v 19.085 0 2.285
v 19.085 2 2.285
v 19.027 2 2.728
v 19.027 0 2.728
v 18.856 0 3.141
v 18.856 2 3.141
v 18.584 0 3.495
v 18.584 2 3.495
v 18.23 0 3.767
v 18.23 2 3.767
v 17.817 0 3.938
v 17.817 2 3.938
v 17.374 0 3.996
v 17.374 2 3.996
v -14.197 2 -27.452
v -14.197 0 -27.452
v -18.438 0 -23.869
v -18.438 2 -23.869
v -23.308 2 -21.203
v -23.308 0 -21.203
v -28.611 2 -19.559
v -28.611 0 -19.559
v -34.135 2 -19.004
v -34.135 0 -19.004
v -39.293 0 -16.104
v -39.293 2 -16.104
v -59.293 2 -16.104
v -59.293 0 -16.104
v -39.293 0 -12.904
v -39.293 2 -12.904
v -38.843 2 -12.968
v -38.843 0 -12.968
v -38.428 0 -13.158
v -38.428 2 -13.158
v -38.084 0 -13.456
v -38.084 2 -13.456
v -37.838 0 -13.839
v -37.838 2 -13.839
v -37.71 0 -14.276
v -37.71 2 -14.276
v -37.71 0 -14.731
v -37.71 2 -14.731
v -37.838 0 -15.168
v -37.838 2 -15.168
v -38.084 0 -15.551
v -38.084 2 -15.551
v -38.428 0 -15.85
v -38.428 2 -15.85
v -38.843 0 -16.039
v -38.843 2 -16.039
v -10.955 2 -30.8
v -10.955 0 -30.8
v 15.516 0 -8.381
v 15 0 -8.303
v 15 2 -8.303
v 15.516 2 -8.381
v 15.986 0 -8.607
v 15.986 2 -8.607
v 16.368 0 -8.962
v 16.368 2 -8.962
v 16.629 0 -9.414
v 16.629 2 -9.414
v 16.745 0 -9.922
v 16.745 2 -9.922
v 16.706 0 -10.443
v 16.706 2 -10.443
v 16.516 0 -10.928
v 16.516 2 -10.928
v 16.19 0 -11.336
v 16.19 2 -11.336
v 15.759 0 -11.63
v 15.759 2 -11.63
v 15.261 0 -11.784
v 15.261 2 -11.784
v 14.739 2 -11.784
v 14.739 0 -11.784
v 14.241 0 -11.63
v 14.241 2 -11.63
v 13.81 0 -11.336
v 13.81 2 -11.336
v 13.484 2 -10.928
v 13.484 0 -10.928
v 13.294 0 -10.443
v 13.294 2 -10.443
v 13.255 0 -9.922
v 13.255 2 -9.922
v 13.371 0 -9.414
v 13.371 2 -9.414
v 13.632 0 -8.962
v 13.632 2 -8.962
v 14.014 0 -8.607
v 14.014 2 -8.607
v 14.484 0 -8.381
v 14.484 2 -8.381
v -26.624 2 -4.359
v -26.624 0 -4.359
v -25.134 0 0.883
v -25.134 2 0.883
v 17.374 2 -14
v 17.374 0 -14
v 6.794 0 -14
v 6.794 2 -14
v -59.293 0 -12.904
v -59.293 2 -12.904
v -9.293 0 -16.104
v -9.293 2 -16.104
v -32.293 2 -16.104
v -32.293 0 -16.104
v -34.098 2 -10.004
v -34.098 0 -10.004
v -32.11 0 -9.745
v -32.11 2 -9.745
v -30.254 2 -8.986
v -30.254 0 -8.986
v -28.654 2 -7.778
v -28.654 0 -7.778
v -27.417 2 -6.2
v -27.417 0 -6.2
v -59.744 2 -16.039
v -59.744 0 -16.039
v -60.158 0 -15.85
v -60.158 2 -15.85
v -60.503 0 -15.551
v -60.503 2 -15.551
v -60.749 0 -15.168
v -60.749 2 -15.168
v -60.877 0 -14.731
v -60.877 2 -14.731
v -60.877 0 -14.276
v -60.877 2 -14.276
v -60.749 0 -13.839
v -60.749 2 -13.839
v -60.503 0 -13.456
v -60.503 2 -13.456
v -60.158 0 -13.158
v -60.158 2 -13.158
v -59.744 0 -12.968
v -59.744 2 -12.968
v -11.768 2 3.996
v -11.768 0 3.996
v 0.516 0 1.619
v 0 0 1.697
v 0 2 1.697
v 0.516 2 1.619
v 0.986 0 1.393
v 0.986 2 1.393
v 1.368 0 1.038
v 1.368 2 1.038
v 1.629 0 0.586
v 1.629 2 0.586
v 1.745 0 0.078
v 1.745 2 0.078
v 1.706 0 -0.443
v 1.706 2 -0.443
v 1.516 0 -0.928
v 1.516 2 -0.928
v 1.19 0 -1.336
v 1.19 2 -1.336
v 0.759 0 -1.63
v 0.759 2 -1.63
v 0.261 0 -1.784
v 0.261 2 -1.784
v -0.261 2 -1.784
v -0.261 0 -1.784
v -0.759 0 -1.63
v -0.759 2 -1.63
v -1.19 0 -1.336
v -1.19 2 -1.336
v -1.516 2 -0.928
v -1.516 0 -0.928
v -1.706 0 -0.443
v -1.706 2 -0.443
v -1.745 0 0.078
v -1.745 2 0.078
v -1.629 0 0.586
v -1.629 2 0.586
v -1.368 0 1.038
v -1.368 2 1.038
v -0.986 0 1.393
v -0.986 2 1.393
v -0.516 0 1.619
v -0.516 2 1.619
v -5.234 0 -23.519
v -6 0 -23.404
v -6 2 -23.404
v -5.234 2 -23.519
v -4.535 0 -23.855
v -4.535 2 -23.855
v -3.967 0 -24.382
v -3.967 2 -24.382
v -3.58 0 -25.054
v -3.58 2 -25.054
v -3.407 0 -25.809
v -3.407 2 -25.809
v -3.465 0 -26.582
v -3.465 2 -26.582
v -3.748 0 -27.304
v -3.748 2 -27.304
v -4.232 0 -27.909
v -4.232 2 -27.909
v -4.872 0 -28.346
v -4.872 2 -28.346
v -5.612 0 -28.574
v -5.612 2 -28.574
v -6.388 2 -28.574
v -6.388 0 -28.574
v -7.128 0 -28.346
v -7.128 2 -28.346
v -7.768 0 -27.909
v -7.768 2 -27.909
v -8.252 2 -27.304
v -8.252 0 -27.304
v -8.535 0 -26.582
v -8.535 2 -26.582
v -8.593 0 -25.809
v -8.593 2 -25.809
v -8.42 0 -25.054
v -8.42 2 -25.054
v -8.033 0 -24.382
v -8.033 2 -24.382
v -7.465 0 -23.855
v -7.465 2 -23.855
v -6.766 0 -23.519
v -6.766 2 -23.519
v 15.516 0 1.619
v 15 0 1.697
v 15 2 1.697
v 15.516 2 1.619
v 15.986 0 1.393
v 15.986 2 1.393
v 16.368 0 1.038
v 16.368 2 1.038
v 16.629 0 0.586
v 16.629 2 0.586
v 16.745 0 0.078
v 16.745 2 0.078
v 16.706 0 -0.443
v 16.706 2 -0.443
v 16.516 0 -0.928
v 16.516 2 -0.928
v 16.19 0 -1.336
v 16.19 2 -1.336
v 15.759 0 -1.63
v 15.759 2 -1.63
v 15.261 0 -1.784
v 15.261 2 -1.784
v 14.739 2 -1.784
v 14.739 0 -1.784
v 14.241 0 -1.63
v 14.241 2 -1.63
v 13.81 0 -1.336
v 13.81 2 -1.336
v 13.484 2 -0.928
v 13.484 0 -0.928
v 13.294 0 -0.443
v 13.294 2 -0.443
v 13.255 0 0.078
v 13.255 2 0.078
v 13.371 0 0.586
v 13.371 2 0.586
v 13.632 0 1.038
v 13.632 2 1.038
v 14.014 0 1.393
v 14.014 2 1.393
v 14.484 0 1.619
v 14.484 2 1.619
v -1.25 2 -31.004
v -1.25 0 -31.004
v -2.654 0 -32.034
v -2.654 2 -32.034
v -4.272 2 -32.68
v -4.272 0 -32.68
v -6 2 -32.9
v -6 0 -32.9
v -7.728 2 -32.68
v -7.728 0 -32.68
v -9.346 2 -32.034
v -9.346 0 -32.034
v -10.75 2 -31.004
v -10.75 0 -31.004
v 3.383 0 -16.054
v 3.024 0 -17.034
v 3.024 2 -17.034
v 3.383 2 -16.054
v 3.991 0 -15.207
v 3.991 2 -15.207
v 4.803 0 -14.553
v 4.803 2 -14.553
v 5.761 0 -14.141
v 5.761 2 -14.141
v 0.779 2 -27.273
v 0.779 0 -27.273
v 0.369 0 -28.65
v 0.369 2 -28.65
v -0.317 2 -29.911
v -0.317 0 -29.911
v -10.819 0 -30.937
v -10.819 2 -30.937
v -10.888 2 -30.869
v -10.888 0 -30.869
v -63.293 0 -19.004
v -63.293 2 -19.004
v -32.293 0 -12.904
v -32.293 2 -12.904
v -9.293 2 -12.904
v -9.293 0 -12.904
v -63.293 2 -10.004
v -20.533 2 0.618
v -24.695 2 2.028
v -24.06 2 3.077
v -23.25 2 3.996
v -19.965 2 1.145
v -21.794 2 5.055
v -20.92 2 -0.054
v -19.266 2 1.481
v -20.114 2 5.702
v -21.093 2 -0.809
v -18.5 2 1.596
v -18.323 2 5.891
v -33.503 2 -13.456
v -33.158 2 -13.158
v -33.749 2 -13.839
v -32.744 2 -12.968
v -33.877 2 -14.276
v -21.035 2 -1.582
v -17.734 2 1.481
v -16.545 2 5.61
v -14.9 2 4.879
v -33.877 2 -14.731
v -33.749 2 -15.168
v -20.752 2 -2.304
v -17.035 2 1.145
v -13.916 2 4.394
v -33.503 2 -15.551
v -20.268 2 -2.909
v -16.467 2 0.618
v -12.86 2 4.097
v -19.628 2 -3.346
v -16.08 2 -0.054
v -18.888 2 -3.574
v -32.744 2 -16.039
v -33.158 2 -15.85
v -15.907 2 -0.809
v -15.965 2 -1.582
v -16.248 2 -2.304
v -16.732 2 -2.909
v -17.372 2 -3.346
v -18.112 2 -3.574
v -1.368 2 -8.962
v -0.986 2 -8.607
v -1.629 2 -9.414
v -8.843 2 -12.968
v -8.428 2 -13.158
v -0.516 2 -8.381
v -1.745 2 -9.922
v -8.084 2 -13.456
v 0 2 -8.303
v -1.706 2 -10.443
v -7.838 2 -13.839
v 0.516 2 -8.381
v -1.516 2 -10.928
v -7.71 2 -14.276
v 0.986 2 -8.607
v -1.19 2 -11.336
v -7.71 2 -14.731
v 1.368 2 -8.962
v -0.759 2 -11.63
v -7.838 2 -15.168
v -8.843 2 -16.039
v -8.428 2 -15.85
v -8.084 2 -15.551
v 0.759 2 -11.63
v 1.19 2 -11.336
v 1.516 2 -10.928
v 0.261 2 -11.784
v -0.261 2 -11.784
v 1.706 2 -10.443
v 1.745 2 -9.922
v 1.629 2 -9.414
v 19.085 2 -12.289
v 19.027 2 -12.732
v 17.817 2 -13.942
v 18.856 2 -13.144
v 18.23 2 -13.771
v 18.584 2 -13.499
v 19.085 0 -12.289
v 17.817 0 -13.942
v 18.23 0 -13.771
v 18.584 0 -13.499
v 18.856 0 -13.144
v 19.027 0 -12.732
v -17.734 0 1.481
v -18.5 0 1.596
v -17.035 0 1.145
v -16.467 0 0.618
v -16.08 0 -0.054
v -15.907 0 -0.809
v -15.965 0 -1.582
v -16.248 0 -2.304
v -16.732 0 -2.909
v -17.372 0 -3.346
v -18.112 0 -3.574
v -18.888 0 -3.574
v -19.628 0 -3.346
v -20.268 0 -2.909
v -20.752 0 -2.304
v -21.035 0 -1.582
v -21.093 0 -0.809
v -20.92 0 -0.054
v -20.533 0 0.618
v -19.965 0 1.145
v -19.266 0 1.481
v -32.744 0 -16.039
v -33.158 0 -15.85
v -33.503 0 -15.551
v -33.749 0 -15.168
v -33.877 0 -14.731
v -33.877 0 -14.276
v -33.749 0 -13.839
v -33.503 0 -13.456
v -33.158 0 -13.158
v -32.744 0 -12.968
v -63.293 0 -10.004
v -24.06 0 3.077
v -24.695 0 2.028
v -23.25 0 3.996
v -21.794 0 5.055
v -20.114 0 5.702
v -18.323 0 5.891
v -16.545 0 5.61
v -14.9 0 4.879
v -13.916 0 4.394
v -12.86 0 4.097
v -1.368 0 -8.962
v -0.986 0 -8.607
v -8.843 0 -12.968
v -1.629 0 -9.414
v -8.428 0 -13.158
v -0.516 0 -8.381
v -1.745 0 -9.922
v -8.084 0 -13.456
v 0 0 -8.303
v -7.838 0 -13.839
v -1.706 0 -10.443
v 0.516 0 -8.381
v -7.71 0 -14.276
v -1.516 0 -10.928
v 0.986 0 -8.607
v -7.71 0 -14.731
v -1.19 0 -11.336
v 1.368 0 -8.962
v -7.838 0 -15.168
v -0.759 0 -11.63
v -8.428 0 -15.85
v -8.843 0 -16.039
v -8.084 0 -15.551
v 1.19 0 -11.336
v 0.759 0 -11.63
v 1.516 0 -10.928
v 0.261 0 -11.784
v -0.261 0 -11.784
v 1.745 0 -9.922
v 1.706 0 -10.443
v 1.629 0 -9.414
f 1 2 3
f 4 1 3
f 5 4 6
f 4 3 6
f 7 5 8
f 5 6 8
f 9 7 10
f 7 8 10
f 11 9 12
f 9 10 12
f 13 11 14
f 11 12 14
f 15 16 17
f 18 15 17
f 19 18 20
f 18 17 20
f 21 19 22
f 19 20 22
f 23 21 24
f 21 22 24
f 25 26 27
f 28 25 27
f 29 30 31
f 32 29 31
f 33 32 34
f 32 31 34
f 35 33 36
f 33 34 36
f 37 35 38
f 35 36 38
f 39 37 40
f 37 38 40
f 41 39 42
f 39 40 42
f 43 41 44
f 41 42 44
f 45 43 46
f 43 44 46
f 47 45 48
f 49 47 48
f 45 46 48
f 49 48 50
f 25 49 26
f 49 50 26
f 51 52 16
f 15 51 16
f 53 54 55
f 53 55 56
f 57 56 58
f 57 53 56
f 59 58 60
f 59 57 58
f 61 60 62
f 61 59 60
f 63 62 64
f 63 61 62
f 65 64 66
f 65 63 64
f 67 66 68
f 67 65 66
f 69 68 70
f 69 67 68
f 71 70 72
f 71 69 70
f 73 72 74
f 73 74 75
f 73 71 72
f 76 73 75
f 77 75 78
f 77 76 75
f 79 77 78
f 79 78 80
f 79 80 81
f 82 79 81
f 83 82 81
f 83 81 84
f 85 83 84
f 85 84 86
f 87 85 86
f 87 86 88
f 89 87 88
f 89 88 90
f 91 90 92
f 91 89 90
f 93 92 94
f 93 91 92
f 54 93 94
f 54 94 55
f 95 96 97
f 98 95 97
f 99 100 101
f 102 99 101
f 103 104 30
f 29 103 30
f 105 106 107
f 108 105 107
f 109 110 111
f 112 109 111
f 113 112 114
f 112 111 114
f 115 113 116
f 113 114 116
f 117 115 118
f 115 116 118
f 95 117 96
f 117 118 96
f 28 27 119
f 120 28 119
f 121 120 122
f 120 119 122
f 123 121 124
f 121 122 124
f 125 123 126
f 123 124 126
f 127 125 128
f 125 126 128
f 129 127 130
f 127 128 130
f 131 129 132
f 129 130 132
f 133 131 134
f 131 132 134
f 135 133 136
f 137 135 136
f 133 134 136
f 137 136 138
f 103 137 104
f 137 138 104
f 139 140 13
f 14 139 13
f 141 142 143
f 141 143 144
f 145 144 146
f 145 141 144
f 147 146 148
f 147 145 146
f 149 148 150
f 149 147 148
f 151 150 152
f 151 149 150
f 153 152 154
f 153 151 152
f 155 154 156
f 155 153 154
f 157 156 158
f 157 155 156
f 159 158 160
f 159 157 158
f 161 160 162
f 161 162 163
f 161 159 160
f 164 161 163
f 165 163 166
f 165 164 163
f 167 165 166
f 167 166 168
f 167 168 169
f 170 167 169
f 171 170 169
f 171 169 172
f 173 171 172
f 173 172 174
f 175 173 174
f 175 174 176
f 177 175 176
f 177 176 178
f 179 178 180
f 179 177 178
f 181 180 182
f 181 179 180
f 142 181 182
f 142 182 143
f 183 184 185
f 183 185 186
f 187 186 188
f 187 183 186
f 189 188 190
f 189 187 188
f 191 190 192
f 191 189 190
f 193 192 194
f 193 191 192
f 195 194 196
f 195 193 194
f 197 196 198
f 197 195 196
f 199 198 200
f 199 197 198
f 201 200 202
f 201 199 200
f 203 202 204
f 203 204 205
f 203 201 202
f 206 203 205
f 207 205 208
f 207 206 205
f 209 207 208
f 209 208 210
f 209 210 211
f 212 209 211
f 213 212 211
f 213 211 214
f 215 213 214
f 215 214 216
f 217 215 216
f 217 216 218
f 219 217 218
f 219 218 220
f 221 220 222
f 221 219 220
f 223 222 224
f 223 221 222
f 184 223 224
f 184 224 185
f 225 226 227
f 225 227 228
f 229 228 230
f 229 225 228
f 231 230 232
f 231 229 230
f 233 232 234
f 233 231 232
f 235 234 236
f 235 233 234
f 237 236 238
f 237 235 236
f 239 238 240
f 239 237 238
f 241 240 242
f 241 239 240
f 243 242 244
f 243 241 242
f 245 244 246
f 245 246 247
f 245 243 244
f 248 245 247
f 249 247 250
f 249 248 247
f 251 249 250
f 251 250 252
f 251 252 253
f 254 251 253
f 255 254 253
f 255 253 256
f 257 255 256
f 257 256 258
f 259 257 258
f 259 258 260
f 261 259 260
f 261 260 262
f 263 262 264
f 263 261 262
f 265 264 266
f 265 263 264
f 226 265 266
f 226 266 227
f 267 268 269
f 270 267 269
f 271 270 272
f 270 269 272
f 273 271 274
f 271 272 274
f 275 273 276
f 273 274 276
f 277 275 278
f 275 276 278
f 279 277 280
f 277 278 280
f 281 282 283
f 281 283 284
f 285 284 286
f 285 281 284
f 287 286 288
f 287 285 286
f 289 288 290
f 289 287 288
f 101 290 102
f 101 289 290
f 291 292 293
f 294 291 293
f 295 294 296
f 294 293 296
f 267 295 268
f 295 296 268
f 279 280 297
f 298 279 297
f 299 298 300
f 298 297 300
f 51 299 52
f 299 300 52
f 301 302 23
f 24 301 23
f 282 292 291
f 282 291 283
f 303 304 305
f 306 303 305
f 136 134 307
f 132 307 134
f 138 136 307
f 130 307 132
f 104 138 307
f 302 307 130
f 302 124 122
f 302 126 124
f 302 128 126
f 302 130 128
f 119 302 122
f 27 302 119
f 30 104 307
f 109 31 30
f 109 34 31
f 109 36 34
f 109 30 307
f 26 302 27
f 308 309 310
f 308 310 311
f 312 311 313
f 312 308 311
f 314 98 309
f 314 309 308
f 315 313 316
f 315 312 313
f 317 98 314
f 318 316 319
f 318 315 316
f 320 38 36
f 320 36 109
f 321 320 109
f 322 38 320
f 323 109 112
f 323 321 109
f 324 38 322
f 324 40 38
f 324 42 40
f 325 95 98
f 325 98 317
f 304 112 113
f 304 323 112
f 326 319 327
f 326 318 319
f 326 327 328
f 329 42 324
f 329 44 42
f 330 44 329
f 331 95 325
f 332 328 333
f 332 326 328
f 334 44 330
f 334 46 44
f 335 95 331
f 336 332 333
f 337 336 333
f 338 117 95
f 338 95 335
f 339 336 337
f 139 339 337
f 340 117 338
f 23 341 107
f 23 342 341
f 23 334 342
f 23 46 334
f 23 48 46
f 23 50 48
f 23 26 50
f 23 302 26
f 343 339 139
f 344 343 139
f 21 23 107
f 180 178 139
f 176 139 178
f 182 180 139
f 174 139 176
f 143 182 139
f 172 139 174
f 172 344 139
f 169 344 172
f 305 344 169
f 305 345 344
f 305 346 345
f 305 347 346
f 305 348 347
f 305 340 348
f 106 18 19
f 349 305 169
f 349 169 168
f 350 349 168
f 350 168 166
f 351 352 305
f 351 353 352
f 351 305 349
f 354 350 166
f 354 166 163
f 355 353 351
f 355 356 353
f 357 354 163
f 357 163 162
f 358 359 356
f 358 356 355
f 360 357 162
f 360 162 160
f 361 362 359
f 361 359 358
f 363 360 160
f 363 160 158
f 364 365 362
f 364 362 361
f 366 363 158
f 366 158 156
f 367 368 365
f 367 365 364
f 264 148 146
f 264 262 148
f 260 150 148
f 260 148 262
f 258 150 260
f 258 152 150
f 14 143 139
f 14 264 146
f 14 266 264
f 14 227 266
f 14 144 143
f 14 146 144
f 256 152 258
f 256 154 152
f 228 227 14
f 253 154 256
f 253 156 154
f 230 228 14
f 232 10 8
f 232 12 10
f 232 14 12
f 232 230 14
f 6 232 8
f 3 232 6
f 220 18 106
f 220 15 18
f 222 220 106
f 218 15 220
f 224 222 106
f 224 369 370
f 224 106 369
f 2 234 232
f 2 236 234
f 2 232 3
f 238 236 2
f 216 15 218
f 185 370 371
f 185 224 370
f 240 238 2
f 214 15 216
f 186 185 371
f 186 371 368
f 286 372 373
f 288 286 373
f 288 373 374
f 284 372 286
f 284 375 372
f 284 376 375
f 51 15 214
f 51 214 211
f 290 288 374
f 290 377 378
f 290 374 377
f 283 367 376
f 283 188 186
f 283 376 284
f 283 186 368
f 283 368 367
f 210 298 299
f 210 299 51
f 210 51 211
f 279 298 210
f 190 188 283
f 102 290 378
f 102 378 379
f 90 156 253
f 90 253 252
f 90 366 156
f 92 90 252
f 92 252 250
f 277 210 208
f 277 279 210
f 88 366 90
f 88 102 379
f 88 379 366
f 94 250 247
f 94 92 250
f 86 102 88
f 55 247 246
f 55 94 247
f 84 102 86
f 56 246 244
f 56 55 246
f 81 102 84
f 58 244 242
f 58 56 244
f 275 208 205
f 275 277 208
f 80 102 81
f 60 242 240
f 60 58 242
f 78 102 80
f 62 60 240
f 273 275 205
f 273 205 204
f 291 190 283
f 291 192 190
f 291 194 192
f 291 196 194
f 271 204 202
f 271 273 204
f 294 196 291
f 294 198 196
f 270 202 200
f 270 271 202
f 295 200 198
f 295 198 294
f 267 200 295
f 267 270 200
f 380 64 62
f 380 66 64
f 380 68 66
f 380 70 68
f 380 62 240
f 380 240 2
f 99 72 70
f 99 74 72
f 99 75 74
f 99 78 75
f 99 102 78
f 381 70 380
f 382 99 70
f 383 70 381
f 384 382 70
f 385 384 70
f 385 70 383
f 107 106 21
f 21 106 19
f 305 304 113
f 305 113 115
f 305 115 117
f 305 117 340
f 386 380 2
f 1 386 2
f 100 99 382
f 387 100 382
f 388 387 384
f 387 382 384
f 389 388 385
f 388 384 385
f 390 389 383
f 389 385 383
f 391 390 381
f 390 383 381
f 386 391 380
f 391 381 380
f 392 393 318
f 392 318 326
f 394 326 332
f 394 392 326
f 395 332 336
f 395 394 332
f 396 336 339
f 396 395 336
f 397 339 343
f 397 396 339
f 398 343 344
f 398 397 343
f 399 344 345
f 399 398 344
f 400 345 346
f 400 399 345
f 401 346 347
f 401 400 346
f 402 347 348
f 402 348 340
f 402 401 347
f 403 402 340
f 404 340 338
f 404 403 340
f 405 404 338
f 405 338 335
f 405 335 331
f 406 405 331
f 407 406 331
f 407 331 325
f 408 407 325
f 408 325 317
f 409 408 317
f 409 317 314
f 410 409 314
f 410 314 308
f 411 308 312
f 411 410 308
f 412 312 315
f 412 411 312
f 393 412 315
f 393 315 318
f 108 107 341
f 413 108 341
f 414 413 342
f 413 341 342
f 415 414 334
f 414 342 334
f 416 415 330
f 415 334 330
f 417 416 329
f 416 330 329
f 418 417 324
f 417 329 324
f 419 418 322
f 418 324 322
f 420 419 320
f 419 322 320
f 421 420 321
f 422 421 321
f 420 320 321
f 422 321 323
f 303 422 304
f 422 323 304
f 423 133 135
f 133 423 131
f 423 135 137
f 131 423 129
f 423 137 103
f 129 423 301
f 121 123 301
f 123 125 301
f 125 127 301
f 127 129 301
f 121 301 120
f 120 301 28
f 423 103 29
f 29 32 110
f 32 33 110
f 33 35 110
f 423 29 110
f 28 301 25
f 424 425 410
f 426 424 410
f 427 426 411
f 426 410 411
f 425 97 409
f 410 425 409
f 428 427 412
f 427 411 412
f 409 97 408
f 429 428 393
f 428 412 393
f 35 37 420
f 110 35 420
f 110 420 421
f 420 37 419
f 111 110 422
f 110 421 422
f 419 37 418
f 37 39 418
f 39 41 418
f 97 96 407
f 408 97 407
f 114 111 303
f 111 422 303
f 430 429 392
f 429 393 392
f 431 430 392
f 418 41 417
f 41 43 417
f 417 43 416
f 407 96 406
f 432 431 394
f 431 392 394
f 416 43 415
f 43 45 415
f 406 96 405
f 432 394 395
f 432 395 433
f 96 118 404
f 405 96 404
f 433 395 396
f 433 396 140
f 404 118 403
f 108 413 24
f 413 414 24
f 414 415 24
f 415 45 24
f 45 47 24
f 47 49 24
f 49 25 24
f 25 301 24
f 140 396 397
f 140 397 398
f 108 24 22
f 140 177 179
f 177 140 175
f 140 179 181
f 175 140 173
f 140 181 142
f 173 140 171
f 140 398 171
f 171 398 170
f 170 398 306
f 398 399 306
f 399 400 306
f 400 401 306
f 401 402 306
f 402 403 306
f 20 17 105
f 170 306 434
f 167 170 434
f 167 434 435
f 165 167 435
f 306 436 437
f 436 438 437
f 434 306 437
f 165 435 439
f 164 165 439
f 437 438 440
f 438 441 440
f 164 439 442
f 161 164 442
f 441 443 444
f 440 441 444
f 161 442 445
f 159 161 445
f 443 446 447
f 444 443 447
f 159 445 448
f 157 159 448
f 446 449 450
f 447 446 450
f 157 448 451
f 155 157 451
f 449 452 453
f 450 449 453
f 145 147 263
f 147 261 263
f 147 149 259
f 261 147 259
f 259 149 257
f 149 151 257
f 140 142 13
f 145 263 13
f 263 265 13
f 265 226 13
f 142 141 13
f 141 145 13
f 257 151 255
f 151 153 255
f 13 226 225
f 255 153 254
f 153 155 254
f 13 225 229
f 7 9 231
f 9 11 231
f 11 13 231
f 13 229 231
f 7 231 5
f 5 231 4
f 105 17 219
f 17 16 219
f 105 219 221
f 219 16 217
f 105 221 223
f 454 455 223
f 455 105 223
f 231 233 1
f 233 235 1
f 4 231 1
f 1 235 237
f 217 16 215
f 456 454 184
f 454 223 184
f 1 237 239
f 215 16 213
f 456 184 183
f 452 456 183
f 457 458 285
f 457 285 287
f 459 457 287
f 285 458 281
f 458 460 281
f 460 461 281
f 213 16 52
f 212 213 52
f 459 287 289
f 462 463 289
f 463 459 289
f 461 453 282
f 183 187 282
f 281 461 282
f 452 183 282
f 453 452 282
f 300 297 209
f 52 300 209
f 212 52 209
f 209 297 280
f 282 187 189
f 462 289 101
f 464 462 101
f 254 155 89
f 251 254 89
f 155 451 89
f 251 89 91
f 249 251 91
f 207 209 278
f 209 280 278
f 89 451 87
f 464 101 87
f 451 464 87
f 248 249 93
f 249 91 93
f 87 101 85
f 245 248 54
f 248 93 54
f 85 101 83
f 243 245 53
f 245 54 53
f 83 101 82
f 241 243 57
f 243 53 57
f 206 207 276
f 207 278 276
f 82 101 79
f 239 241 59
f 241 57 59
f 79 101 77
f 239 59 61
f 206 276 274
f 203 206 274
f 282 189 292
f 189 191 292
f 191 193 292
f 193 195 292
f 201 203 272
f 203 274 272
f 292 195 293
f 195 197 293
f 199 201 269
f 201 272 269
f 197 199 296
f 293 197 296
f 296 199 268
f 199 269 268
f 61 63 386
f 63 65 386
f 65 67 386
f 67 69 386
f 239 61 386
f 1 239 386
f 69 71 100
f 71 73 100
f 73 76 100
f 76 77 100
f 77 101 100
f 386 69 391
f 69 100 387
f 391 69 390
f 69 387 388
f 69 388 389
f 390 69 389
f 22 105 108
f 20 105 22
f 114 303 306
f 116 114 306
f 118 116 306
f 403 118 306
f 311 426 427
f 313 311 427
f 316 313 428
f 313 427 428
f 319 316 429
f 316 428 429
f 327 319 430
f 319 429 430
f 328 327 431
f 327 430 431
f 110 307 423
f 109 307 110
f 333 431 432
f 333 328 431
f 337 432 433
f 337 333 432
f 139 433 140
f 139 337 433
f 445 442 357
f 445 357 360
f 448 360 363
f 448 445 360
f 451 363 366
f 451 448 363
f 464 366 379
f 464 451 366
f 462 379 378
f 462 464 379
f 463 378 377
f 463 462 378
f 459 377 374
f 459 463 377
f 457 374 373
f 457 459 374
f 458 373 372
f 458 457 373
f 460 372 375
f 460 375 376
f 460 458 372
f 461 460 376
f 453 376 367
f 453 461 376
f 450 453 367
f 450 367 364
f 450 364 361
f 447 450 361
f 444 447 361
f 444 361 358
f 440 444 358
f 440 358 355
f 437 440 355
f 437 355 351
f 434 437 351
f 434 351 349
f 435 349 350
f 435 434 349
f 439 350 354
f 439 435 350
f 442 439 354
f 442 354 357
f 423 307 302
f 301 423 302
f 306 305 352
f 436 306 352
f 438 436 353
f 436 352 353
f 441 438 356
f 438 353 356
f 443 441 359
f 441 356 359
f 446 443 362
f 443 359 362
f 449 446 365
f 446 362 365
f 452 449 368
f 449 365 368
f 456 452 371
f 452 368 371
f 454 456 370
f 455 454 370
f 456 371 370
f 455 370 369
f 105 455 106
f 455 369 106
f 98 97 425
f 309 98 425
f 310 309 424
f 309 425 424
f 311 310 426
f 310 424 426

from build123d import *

# Parameters (mm, degrees)
SKETCH_2_R          = 2.6
SKETCH_2_R_2        = 1.75
EXTRUDE_3_DEPTH     = 2
EXTRUDE_START       = -2
SKETCH_3_R          = 2.6
EXTRUDE_4_DEPTH     = 2
EXTRUDE_5_DEPTH     = 2
FILLET_1_R          = 6
CUT_EXTRUDE_1_DEPTH = 2
EXTRUDE_6_DEPTH     = 2
SKETCH_8_W          = 26
SKETCH_8_H          = 9
EXTRUDE_7_DEPTH     = 2


with BuildPart() as part:
    # 草图2 → 凸台-拉伸3 (new body)
    with BuildSketch(Plane(origin=(0, 0, 0), x_dir=(1, 0, 0), z_dir=(0, 1, 0))):
        Polygon((15, 14), (-1.25, 14), (-1.25, 31.003525978), (-10.75, 31.003525978), (-10.75, 19.003525978), (-37.293472201, 19.003525978), (-37.293472201, 10.003525978), (-23.25, 10.003525978), (-23.25, -3.996474022), (-13.75, -3.996474022), (15, -3.996474022), (17.373946176, -3.996474022), (17.373946176, 14), align=None)
        with Locations(Location((-18.5, 1.003525978, 0), (0, 0, 270))):
            Circle(SKETCH_2_R, mode=Mode.SUBTRACT)
        with Locations(Location((0, 0.053173587, 0), (0, 0, 270))):
            Circle(SKETCH_2_R_2, mode=Mode.SUBTRACT)
        with Locations(Location((15, 0.053173587, 0), (0, 0, 270))):
            Circle(SKETCH_2_R_2, mode=Mode.SUBTRACT)
        with Locations(Location((0, 10.053173587, 0), (0, 0, 270))):
            Circle(SKETCH_2_R_2, mode=Mode.SUBTRACT)
        with Locations(Location((15, 10.053173587, 0), (0, 0, 270))):
            Circle(SKETCH_2_R_2, mode=Mode.SUBTRACT)
        with Locations(Location((-6, 26.003525978, 0), (0, 0, 270))):
            Circle(SKETCH_2_R, mode=Mode.SUBTRACT)
    extrude(amount=EXTRUDE_3_DEPTH)

    # 草图3 → 凸台-拉伸4 (add)
    # profile 1 of 9: a face of its own
    with BuildSketch(Plane(origin=(0, 2, 0), x_dir=(1, 0, 0), z_dir=(0, 1, 0)).offset(EXTRUDE_START)):
        with BuildLine():
            Line((-1.25, 31.003525978), (-10.75, 31.003525978))
            Line((-10.75, 31.003525978), (-10.75, 21.003525978))
            ThreePointArc((-10.75, 21.003525978), (-8.557314455, 19.59863388), (-6, 19.106968866))
            ThreePointArc((-6, 19.106968866), (-3.442685545, 19.59863388), (-1.25, 21.003525978))
            Line((-1.25, 21.003525978), (-1.25, 31.003525978))
        make_face()
        with Locations(Location((-6, 26.003525978, 0), (0, 0, 270))):
            Circle(SKETCH_3_R, mode=Mode.SUBTRACT)
    # profile 2 of 9: a face of its own
    with BuildSketch(Plane(origin=(0, 2, 0), x_dir=(1, 0, 0), z_dir=(0, 1, 0)).offset(EXTRUDE_START)):
        with BuildLine():
            ThreePointArc((-10.75, 21.003525978), (-12.895048442, 25.85927974), (-10.9549552, 30.800495747))
            Line((-10.9549552, 30.800495747), (-14.196613842, 27.452074948))
            ThreePointArc((-14.196613842, 27.452074948), (-23.307699904, 21.20281017), (-34.134904, 19.003525978))
            Line((-34.134904, 19.003525978), (-10.75, 19.003525978))
            Line((-10.75, 19.003525978), (-10.75, 21.003525978))
        make_face()
    # profile 3 of 9: a face of its own
    with BuildSketch(Plane(origin=(0, 2, 0), x_dir=(1, 0, 0), z_dir=(0, 1, 0)).offset(EXTRUDE_START)):
        with BuildLine():
            ThreePointArc((-1.25, 31.003525978), (-6, 32.90008309), (-10.75, 31.003525978))
            Line((-10.75, 31.003525978), (-1.25, 31.003525978))
        make_face()
    # profile 4 of 9: a face of its own
    with BuildSketch(Plane(origin=(0, 2, 0), x_dir=(1, 0, 0), z_dir=(0, 1, 0)).offset(EXTRUDE_START)):
        with BuildLine():
            ThreePointArc((0.896557112, 26.003525978), (0.337237027, 28.72417422), (-1.25, 31.003525978))
            Line((-1.25, 31.003525978), (-1.25, 21.003525978))
            ThreePointArc((-1.25, 21.003525978), (0.337237027, 23.282877735), (0.896557112, 26.003525978))
        make_face()
    # profile 5 of 9: a face of its own
    with BuildSketch(Plane(origin=(0, 2, 0), x_dir=(1, 0, 0), z_dir=(0, 1, 0)).offset(EXTRUDE_START)):
        with BuildLine():
            Line((-26.624271801, 4.358914994), (-25.133517426, -0.882991066))
            ThreePointArc((-25.133517426, -0.882991066), (-25.152228686, 2.822963667), (-23.25, 6.003525978))
            Line((-23.25, 6.003525978), (-23.25, 10.003525978))
            Line((-23.25, 10.003525978), (-34.097989538, 10.003525978))
            ThreePointArc((-34.097989538, 10.003525978), (-29.415092732, 8.433817083), (-26.624271801, 4.358914994))
        make_face()
    # profile 6 of 9: a face of its own
    with BuildSketch(Plane(origin=(0, 2, 0), x_dir=(1, 0, 0), z_dir=(0, 1, 0)).offset(EXTRUDE_START)):
        with BuildLine():
            ThreePointArc((-11.603442888, 1.003525978), (-15.779351758, 7.340763005), (-23.25, 6.003525978))
            Line((-23.25, 6.003525978), (-23.25, -3.996474022))
            Line((-23.25, -3.996474022), (-13.75, -3.996474022))
            ThreePointArc((-13.75, -3.996474022), (-12.162762973, -1.717122265), (-11.603442888, 1.003525978))
        make_face()
        with Locations(Location((-18.5, 1.003525978, 0), (0, 0, 270))):
            Circle(SKETCH_3_R, mode=Mode.SUBTRACT)
    # profile 7 of 9: a face of its own
    with BuildSketch(Plane(origin=(0, 2, 0), x_dir=(1, 0, 0), z_dir=(0, 1, 0)).offset(EXTRUDE_START)):
        with BuildLine():
            ThreePointArc((-23.25, 6.003525978), (-25.152228686, 2.822963667), (-25.133517426, -0.882991066))
            ThreePointArc((-25.133517426, -0.882991066), (-24.400810222, -2.566199323), (-23.25, -3.996474022))
            Line((-23.25, -3.996474022), (-23.25, 6.003525978))
        make_face()
    # profile 8 of 9: a face of its own
    with BuildSketch(Plane(origin=(0, 2, 0), x_dir=(1, 0, 0), z_dir=(0, 1, 0)).offset(EXTRUDE_START)):
        with BuildLine():
            Line((-13.75, -3.996474022), (-23.25, -3.996474022))
            ThreePointArc((-23.25, -3.996474022), (-18.5, -5.893031134), (-13.75, -3.996474022))
        make_face()
    # profile 9 of 9: a face of its own
    with BuildSketch(Plane(origin=(0, 2, 0), x_dir=(1, 0, 0), z_dir=(0, 1, 0)).offset(EXTRUDE_START)):
        with BuildLine():
            ThreePointArc((-10.75, 31.003525978), (-10.853539345, 30.903082674), (-10.9549552, 30.800495747))
            ThreePointArc((-10.9549552, 30.800495747), (-12.895048442, 25.85927974), (-10.75, 21.003525978))
            Line((-10.75, 21.003525978), (-10.75, 31.003525978))
        make_face()
    extrude(amount=EXTRUDE_4_DEPTH)

    # 草图4 → 凸台-拉伸5 (add)
    with BuildSketch(Plane.XZ):
        with BuildLine():
            ThreePointArc((-1.25, -21.003525978), (0.561593491, -23.880323006), (0.778699813, -27.273064812))
            Line((0.778699813, -27.273064812), (3.023667629, -17.033583157))
            ThreePointArc((3.023667629, -17.033583157), (4.374639496, -14.852535674), (6.79440726, -14))
            Line((6.79440726, -14), (-1.25, -14))
            Line((-1.25, -14), (-1.25, -21.003525978))
        make_face()
    extrude(amount=-EXTRUDE_5_DEPTH)

    # 圆角1
    fillet_1_edges = [part.edges().sort_by_distance(p)[0] for p in [
        (-13.75, 1, 3.996474022),
    ]]
    fillet(fillet_1_edges, radius=FILLET_1_R)

    # 草图6 → 切除-拉伸1 (cut)
    with BuildSketch(Plane(origin=(0, 2, 0), x_dir=(1, 0, 0), z_dir=(0, 1, 0))):
        with BuildLine():
            Line((-32.293472201, 12.903525978), (-9.293472201, 12.903525978))
            ThreePointArc((-9.293472201, 12.903525978), (-7.693472201, 14.503525978), (-9.293472201, 16.103525978))
            Line((-9.293472201, 16.103525978), (-32.293472201, 16.103525978))
            ThreePointArc((-32.293472201, 16.103525978), (-33.893472201, 14.503525978), (-32.293472201, 12.903525978))
        make_face()
    extrude(amount=-CUT_EXTRUDE_1_DEPTH, mode=Mode.SUBTRACT)

    # 草图7 → 凸台-拉伸6 (add)
    with BuildSketch(Plane(origin=(0, 2, 0), x_dir=(1, 0, 0), z_dir=(0, 1, 0))):
        with BuildLine():
            Line((19.085277426, 12.28866875), (19.085277426, -2.285142773))
            ThreePointArc((19.085277426, -2.285142773), (18.584040107, -3.495236704), (17.373946176, -3.996474022))
            Line((17.373946176, -3.996474022), (17.373946176, 14))
            ThreePointArc((17.373946176, 14), (18.584040107, 13.498762682), (19.085277426, 12.28866875))
        make_face()
    extrude(amount=-EXTRUDE_6_DEPTH)

    # 草图8 → 凸台-拉伸7 (add)
    with BuildSketch(Plane(origin=(0, 2, 0), x_dir=(1, 0, 0), z_dir=(0, 1, 0))):
        with Locations((-50.293472201, 14.503525978)):
            Rectangle(SKETCH_8_W, SKETCH_8_H)
        with BuildLine():
            ThreePointArc((-39.293472201, 12.903525978), (-37.693472201, 14.503525978), (-39.293472201, 16.103525978))
            Line((-39.293472201, 16.103525978), (-59.293472201, 16.103525978))
            ThreePointArc((-59.293472201, 16.103525978), (-60.893472201, 14.503525978), (-59.293472201, 12.903525978))
            Line((-59.293472201, 12.903525978), (-39.293472201, 12.903525978))
        make_face(mode=Mode.SUBTRACT)
    extrude(amount=-EXTRUDE_7_DEPTH)


solid = part.part
